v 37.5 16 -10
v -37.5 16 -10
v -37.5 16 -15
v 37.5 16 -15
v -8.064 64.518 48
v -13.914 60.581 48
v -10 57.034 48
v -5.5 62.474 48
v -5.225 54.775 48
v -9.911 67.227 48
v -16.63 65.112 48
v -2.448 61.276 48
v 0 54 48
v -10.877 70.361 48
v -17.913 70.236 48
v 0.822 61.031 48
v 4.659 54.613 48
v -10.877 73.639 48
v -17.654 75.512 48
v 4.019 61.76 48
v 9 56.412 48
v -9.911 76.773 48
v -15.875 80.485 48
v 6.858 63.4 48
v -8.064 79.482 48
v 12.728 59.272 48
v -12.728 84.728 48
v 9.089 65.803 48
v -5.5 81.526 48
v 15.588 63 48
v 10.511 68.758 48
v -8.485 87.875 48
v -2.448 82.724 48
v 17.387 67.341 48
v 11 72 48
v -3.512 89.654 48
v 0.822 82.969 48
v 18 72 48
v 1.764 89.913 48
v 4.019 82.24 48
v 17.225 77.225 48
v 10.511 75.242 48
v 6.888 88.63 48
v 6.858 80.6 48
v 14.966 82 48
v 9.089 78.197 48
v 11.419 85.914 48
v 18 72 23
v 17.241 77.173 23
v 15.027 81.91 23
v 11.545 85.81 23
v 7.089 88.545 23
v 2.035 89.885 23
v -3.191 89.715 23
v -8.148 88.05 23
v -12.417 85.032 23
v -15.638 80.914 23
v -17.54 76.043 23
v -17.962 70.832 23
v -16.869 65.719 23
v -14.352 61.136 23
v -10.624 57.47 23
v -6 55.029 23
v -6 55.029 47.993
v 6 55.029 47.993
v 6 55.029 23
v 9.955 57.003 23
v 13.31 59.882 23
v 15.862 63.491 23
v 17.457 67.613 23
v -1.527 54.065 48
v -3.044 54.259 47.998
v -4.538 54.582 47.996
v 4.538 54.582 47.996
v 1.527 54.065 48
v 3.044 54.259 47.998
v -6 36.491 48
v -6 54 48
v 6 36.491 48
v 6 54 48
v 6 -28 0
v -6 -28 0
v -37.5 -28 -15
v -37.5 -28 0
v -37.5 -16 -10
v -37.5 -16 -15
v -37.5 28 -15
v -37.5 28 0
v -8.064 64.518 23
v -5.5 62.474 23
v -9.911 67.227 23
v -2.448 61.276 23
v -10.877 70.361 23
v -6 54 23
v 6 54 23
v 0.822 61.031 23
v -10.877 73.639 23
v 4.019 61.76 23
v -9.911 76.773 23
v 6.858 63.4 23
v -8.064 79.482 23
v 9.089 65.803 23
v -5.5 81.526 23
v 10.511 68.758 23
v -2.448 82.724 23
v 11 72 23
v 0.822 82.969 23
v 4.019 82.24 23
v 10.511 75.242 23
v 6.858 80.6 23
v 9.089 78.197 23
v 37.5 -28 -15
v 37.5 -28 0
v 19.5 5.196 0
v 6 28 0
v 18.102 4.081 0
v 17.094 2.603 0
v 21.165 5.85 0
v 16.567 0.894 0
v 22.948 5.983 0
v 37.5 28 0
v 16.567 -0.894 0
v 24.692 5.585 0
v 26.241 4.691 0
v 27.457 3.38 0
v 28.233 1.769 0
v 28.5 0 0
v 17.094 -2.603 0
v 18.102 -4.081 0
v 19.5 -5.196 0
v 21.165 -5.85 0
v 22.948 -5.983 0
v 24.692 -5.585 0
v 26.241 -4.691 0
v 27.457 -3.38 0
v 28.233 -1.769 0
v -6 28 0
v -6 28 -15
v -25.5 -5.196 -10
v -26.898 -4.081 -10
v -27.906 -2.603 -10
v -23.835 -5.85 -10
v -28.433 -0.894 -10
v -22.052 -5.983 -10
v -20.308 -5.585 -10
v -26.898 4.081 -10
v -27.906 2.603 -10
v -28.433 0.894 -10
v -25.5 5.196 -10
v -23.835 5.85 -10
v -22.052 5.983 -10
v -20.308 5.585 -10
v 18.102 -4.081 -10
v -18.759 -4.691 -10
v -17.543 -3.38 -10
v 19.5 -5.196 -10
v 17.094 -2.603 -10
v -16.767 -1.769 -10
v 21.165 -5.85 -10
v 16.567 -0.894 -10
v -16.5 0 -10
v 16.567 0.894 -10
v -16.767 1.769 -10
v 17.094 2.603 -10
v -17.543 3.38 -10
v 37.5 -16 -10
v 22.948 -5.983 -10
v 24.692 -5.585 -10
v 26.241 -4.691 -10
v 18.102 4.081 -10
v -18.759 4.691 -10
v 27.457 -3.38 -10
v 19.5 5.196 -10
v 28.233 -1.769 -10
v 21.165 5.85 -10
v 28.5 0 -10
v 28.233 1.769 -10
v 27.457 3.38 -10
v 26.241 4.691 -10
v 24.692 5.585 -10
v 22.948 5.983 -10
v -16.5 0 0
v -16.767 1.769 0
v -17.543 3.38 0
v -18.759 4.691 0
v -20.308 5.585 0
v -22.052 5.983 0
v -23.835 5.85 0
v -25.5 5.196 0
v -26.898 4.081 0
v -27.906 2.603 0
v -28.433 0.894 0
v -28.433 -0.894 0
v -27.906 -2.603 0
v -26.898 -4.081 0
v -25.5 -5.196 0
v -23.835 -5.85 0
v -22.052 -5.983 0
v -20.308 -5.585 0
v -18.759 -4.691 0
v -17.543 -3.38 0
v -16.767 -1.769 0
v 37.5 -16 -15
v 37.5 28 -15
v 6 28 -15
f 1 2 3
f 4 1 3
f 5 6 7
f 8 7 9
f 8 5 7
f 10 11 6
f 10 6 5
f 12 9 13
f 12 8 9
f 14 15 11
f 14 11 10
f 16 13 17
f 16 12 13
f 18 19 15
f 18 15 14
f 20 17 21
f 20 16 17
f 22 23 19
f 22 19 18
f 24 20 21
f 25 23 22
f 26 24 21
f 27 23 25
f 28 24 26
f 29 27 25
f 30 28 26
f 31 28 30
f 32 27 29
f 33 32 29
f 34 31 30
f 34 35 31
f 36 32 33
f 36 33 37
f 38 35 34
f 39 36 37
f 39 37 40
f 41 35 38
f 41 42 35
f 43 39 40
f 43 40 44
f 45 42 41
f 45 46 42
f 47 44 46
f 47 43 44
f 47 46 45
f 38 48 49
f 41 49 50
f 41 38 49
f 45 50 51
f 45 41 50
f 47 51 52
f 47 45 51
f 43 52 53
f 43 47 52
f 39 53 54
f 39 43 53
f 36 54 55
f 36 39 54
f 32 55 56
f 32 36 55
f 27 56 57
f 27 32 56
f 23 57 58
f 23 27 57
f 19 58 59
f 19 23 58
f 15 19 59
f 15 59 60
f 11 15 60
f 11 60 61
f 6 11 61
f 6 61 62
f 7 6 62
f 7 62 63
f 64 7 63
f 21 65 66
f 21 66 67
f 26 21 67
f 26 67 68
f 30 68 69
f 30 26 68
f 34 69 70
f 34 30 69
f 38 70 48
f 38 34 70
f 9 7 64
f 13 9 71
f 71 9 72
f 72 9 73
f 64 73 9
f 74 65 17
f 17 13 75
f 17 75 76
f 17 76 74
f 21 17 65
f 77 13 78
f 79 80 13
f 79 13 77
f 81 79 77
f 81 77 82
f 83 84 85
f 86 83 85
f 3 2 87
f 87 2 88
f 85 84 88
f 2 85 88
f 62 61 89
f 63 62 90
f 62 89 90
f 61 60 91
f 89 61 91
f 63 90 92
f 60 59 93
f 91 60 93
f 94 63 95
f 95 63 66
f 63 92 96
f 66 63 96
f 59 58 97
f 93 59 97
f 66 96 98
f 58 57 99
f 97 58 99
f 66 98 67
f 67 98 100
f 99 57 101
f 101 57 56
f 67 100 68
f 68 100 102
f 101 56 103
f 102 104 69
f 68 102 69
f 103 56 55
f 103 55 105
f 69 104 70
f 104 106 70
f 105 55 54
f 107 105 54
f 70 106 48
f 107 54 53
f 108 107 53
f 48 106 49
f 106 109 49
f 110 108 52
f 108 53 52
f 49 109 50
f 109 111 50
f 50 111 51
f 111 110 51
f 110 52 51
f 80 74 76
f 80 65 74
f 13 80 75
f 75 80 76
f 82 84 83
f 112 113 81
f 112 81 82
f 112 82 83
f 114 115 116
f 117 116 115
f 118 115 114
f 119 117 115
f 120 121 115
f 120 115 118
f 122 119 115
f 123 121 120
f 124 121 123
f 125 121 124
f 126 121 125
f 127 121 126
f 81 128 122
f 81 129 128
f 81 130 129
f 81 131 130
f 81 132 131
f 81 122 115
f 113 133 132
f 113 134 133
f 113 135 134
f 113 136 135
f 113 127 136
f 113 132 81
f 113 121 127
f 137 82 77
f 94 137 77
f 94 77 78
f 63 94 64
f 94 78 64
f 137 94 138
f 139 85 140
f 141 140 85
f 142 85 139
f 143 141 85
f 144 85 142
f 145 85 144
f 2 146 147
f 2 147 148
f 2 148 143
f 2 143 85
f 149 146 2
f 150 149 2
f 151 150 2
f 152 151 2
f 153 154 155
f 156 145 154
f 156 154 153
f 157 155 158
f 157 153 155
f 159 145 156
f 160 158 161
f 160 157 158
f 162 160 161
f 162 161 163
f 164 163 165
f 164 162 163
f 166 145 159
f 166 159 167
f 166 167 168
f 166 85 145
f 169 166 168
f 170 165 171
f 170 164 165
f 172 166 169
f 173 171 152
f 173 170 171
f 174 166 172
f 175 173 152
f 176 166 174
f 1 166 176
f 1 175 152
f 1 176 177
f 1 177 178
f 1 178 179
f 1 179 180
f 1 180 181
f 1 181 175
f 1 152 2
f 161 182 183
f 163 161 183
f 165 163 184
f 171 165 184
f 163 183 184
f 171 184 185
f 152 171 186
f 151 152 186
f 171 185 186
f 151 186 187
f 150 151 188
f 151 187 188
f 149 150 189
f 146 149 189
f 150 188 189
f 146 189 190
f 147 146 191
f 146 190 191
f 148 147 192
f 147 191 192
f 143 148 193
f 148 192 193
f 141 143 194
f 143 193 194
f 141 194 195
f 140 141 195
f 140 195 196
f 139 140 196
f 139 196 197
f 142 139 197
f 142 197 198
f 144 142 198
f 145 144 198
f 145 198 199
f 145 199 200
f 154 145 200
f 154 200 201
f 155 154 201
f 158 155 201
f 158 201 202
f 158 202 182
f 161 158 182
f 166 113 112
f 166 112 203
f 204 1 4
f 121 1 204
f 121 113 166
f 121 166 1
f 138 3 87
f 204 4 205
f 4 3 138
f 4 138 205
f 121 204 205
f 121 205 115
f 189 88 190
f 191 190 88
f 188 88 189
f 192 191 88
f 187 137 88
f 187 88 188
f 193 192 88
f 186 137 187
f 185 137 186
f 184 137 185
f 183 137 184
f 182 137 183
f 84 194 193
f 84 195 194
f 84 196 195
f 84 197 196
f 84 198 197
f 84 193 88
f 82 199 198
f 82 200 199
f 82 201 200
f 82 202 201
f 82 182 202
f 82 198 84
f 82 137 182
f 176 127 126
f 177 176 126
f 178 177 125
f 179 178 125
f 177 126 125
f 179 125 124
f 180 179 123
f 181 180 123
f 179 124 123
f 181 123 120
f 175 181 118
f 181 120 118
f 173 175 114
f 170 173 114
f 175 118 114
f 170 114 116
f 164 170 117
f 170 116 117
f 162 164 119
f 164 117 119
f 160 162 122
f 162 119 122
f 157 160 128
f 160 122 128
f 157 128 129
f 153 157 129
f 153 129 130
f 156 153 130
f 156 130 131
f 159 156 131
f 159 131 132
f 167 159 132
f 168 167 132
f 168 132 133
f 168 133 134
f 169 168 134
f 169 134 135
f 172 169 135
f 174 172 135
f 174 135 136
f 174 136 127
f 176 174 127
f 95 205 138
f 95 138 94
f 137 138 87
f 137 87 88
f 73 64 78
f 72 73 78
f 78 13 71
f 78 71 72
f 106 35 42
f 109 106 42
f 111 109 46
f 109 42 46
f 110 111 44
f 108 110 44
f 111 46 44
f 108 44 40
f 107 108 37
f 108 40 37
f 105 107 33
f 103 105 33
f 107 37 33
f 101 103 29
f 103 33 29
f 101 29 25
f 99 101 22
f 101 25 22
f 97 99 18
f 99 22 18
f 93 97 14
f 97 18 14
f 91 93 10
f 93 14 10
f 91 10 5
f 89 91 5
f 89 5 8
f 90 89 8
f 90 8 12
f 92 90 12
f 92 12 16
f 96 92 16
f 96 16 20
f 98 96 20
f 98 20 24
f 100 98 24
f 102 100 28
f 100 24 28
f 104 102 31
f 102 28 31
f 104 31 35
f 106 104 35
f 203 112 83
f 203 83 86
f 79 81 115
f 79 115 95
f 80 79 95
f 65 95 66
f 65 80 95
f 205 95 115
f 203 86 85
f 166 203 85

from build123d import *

# Parameters (mm, degrees)
F1_DEPTH = 37.5
F2_R     = 6
F3_DEPTH = 25
F5_DEPTH = 6
F7_R     = 18
F7_R_2   = 11
F8_DEPTH = 25


with BuildPart() as f1:
    # F0 (on Right) → F1 (new body, symmetric)
    with BuildSketch(Plane.YZ):
        Polygon((28, 0), (-28, 0), (-28, -15), (-16, -15), (-16, -10), (16, -10), (16, -15), (28, -15), align=None)
    extrude(amount=F1_DEPTH, both=True)

    # F2 (on face) → F3 (cut)
    with BuildSketch(Plane.XY):
        with Locations((-22.5, 0)):
            Circle(F2_R)
        with Locations((22.5, 0)):
            Circle(F2_R)
    extrude(amount=-F3_DEPTH, mode=Mode.SUBTRACT)

    # F4 (on Right) → F5 (join, symmetric)
    with BuildSketch(Plane.YZ):
        Polygon((54, 48), (36.491035, 48), (-28, 0), (28, 0), (28, -15), (54, 23), (59, 23), (59, 47.966335), align=None)
    extrude(amount=F5_DEPTH, both=True)

    # F7 (on offset) → F8 (join)
    with BuildSketch(Plane.XY.offset(48)):
        with Locations((0, 72)):
            Circle(F7_R)
        with Locations((0, 72)):
            Circle(F7_R_2, mode=Mode.SUBTRACT)
    extrude(amount=-F8_DEPTH)


solid = f1.part
